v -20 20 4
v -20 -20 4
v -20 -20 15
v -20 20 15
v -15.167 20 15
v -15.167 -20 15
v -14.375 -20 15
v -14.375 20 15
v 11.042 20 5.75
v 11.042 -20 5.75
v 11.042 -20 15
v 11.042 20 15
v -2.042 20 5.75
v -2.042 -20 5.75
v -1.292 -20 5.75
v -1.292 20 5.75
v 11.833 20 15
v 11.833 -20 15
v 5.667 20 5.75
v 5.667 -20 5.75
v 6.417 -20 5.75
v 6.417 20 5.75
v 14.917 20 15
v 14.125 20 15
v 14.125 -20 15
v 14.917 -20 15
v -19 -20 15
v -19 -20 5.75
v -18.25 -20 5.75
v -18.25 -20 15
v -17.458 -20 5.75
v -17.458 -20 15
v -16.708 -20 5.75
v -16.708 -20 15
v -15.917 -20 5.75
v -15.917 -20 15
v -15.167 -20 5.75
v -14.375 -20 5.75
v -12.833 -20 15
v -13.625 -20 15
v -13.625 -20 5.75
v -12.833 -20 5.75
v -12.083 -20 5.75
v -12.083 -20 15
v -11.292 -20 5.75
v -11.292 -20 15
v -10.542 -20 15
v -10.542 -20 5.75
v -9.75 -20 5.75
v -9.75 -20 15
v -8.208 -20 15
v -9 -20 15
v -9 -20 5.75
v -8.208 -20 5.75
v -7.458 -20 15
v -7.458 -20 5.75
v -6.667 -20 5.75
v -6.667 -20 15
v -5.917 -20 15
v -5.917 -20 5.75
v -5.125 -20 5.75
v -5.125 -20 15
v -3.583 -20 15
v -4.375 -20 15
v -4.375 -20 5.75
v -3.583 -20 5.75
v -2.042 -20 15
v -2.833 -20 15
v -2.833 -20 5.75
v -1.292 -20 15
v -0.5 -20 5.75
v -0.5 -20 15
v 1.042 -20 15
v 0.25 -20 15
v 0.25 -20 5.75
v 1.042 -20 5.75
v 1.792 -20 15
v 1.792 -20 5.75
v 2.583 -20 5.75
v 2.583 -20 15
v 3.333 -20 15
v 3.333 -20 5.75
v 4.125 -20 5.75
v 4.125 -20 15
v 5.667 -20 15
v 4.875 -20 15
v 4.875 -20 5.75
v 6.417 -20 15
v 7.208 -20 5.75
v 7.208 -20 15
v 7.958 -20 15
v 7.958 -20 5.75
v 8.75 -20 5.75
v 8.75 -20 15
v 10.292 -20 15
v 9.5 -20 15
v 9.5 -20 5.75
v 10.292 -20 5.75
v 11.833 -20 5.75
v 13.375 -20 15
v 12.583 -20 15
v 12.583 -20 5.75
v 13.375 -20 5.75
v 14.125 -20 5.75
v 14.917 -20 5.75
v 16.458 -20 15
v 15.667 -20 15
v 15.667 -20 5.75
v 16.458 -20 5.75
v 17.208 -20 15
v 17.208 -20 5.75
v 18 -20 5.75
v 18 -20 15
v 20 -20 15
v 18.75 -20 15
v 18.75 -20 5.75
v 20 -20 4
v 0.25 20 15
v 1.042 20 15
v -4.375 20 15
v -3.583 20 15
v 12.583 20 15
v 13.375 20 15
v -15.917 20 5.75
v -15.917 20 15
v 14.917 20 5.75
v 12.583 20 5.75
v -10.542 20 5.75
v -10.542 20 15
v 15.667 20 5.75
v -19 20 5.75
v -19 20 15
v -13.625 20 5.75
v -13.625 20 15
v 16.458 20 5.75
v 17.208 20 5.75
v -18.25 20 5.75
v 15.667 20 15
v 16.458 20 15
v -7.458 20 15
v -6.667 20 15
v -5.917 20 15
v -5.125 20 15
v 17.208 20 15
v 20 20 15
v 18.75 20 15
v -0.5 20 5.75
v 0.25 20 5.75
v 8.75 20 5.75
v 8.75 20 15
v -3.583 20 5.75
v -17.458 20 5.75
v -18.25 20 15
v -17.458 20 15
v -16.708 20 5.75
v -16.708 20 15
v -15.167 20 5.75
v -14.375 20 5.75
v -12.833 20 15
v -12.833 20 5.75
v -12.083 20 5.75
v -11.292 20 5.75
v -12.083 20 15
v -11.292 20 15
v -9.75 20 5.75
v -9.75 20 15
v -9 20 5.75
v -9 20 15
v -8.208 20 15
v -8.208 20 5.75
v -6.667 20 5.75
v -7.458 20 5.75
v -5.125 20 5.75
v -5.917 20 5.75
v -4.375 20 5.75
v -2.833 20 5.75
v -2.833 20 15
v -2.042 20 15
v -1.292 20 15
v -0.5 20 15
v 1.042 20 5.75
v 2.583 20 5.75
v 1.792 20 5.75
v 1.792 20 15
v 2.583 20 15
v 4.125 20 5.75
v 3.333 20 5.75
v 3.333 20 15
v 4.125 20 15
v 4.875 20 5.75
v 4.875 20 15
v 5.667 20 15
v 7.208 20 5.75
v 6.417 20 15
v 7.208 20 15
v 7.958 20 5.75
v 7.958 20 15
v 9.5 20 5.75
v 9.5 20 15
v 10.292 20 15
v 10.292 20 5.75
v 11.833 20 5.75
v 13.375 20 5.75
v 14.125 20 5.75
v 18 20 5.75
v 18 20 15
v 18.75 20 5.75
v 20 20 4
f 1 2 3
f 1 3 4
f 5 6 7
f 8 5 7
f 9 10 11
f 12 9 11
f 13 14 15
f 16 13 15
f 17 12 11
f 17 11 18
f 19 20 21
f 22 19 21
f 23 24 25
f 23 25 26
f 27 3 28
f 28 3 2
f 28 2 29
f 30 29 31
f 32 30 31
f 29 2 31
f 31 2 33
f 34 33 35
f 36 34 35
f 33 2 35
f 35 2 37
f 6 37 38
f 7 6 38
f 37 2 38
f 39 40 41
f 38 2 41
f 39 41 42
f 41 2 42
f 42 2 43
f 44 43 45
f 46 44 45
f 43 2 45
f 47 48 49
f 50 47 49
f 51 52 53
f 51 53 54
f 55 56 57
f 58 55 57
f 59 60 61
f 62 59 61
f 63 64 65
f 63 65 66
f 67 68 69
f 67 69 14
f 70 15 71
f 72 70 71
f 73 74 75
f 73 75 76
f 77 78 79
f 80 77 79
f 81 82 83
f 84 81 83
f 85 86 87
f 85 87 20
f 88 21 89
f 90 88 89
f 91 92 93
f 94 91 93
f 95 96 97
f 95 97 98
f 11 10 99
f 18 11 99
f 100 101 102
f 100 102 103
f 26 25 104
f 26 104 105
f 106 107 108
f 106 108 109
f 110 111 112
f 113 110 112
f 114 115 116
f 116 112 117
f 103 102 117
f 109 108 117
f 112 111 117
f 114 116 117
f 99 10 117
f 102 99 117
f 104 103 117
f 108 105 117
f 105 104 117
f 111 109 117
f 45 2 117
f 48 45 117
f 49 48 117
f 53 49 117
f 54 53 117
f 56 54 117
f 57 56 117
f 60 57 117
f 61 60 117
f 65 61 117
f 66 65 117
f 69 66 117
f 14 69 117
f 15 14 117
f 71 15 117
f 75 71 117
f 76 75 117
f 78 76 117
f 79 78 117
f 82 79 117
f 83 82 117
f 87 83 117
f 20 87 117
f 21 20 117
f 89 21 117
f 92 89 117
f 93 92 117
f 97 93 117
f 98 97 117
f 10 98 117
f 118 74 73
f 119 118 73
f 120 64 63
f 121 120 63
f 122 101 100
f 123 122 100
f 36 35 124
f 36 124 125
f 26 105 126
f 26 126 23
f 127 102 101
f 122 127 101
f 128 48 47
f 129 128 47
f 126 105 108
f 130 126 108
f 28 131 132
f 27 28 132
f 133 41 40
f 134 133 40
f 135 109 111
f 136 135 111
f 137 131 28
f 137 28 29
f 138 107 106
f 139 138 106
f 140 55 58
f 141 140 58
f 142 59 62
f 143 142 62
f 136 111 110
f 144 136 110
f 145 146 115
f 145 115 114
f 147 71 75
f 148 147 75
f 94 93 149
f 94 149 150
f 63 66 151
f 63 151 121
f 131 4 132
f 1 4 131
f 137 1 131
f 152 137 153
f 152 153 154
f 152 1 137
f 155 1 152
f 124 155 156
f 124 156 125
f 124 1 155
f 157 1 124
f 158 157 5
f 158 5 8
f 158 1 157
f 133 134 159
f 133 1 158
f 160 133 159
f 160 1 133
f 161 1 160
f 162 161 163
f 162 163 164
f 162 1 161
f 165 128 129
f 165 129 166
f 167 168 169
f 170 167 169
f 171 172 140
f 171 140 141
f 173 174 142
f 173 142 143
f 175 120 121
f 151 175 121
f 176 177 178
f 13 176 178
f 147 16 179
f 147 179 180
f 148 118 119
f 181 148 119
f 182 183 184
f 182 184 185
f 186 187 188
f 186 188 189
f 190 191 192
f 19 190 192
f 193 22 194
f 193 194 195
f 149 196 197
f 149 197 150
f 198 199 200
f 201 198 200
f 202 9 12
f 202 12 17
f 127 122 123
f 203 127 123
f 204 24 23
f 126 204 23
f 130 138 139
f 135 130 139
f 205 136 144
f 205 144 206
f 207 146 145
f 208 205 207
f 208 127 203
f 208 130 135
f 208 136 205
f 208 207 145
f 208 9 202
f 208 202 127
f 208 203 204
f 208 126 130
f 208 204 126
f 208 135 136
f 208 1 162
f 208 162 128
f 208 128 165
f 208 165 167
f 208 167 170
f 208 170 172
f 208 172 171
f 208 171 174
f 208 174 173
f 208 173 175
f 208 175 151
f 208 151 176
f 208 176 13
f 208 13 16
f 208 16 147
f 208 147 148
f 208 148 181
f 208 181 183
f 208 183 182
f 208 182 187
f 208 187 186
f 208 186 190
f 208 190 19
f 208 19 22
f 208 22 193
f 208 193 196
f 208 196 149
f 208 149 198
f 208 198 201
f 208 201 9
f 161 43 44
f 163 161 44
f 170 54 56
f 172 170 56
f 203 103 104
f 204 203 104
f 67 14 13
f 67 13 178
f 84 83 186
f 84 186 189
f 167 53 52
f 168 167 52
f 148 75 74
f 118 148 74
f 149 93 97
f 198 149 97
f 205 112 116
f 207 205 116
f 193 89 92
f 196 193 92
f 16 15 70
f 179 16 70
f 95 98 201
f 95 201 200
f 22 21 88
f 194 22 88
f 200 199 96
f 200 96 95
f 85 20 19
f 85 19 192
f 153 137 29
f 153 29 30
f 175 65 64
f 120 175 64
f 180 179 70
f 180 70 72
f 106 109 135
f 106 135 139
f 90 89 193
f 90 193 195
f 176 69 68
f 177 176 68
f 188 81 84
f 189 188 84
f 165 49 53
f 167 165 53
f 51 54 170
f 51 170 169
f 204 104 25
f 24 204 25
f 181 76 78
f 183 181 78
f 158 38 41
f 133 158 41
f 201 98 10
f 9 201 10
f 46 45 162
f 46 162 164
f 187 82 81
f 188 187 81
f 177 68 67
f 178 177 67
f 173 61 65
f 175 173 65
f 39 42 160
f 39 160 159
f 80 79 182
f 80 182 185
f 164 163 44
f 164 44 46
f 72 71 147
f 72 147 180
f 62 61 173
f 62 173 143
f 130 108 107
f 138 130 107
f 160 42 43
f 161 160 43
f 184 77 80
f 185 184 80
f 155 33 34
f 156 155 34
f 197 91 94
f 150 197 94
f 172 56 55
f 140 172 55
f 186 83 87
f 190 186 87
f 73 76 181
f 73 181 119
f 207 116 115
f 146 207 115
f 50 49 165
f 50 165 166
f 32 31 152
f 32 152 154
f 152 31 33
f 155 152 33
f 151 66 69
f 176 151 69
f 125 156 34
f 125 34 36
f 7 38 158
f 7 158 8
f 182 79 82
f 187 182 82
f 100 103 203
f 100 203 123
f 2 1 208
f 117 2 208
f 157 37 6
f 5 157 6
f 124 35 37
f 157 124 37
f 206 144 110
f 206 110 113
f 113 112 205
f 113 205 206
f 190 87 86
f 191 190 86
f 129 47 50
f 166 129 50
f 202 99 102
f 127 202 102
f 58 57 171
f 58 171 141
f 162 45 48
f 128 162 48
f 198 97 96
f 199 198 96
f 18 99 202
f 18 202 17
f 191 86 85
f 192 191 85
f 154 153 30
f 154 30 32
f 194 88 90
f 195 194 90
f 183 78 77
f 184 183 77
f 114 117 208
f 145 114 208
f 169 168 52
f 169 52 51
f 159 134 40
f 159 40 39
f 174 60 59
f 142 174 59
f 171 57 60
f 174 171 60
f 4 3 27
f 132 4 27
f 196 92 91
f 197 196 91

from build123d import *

# Parameters (mm, degrees)
SKETCH036_W            = 40
SKETCH036_H            = 40
PAD009_DEPTH           = 11
SKETCH037_W            = 0.75
SKETCH037_H            = 13.12
POCKET009_DEPTH        = 20.001
POCKET009_DEPTH_BACK   = 20.001
LINEARPATTERN002_COUNT = 25
LINEARPATTERN002_PITCH = 1.541667


with BuildPart() as part:
    # Sketch036 → Pad009 (new body)
    with BuildSketch(Plane.XY):
        Rectangle(SKETCH036_W, SKETCH036_H)
    extrude(amount=PAD009_DEPTH)

    # Sketch037 → Pocket009 (cut, two sides)
    with BuildSketch(Plane.XZ) as pocket009_sk:
        with Locations((-18.625, 8.31)):
            Rectangle(SKETCH037_W, SKETCH037_H)
    pocket009 = extrude(amount=-POCKET009_DEPTH, mode=Mode.SUBTRACT) + extrude(pocket009_sk.sketch, amount=POCKET009_DEPTH_BACK, mode=Mode.SUBTRACT)

    # LinearPattern002: Pocket009 ×25
    with Locations(*[(i * LINEARPATTERN002_PITCH, 0, 0) for i in range(1, LINEARPATTERN002_COUNT)]):
        add(pocket009, mode=Mode.SUBTRACT)


with BuildPart() as part_1:
    # Body022 placement: moved
    add(part.part.moved(Location((0, 0, 4))))


solid = part_1.part
